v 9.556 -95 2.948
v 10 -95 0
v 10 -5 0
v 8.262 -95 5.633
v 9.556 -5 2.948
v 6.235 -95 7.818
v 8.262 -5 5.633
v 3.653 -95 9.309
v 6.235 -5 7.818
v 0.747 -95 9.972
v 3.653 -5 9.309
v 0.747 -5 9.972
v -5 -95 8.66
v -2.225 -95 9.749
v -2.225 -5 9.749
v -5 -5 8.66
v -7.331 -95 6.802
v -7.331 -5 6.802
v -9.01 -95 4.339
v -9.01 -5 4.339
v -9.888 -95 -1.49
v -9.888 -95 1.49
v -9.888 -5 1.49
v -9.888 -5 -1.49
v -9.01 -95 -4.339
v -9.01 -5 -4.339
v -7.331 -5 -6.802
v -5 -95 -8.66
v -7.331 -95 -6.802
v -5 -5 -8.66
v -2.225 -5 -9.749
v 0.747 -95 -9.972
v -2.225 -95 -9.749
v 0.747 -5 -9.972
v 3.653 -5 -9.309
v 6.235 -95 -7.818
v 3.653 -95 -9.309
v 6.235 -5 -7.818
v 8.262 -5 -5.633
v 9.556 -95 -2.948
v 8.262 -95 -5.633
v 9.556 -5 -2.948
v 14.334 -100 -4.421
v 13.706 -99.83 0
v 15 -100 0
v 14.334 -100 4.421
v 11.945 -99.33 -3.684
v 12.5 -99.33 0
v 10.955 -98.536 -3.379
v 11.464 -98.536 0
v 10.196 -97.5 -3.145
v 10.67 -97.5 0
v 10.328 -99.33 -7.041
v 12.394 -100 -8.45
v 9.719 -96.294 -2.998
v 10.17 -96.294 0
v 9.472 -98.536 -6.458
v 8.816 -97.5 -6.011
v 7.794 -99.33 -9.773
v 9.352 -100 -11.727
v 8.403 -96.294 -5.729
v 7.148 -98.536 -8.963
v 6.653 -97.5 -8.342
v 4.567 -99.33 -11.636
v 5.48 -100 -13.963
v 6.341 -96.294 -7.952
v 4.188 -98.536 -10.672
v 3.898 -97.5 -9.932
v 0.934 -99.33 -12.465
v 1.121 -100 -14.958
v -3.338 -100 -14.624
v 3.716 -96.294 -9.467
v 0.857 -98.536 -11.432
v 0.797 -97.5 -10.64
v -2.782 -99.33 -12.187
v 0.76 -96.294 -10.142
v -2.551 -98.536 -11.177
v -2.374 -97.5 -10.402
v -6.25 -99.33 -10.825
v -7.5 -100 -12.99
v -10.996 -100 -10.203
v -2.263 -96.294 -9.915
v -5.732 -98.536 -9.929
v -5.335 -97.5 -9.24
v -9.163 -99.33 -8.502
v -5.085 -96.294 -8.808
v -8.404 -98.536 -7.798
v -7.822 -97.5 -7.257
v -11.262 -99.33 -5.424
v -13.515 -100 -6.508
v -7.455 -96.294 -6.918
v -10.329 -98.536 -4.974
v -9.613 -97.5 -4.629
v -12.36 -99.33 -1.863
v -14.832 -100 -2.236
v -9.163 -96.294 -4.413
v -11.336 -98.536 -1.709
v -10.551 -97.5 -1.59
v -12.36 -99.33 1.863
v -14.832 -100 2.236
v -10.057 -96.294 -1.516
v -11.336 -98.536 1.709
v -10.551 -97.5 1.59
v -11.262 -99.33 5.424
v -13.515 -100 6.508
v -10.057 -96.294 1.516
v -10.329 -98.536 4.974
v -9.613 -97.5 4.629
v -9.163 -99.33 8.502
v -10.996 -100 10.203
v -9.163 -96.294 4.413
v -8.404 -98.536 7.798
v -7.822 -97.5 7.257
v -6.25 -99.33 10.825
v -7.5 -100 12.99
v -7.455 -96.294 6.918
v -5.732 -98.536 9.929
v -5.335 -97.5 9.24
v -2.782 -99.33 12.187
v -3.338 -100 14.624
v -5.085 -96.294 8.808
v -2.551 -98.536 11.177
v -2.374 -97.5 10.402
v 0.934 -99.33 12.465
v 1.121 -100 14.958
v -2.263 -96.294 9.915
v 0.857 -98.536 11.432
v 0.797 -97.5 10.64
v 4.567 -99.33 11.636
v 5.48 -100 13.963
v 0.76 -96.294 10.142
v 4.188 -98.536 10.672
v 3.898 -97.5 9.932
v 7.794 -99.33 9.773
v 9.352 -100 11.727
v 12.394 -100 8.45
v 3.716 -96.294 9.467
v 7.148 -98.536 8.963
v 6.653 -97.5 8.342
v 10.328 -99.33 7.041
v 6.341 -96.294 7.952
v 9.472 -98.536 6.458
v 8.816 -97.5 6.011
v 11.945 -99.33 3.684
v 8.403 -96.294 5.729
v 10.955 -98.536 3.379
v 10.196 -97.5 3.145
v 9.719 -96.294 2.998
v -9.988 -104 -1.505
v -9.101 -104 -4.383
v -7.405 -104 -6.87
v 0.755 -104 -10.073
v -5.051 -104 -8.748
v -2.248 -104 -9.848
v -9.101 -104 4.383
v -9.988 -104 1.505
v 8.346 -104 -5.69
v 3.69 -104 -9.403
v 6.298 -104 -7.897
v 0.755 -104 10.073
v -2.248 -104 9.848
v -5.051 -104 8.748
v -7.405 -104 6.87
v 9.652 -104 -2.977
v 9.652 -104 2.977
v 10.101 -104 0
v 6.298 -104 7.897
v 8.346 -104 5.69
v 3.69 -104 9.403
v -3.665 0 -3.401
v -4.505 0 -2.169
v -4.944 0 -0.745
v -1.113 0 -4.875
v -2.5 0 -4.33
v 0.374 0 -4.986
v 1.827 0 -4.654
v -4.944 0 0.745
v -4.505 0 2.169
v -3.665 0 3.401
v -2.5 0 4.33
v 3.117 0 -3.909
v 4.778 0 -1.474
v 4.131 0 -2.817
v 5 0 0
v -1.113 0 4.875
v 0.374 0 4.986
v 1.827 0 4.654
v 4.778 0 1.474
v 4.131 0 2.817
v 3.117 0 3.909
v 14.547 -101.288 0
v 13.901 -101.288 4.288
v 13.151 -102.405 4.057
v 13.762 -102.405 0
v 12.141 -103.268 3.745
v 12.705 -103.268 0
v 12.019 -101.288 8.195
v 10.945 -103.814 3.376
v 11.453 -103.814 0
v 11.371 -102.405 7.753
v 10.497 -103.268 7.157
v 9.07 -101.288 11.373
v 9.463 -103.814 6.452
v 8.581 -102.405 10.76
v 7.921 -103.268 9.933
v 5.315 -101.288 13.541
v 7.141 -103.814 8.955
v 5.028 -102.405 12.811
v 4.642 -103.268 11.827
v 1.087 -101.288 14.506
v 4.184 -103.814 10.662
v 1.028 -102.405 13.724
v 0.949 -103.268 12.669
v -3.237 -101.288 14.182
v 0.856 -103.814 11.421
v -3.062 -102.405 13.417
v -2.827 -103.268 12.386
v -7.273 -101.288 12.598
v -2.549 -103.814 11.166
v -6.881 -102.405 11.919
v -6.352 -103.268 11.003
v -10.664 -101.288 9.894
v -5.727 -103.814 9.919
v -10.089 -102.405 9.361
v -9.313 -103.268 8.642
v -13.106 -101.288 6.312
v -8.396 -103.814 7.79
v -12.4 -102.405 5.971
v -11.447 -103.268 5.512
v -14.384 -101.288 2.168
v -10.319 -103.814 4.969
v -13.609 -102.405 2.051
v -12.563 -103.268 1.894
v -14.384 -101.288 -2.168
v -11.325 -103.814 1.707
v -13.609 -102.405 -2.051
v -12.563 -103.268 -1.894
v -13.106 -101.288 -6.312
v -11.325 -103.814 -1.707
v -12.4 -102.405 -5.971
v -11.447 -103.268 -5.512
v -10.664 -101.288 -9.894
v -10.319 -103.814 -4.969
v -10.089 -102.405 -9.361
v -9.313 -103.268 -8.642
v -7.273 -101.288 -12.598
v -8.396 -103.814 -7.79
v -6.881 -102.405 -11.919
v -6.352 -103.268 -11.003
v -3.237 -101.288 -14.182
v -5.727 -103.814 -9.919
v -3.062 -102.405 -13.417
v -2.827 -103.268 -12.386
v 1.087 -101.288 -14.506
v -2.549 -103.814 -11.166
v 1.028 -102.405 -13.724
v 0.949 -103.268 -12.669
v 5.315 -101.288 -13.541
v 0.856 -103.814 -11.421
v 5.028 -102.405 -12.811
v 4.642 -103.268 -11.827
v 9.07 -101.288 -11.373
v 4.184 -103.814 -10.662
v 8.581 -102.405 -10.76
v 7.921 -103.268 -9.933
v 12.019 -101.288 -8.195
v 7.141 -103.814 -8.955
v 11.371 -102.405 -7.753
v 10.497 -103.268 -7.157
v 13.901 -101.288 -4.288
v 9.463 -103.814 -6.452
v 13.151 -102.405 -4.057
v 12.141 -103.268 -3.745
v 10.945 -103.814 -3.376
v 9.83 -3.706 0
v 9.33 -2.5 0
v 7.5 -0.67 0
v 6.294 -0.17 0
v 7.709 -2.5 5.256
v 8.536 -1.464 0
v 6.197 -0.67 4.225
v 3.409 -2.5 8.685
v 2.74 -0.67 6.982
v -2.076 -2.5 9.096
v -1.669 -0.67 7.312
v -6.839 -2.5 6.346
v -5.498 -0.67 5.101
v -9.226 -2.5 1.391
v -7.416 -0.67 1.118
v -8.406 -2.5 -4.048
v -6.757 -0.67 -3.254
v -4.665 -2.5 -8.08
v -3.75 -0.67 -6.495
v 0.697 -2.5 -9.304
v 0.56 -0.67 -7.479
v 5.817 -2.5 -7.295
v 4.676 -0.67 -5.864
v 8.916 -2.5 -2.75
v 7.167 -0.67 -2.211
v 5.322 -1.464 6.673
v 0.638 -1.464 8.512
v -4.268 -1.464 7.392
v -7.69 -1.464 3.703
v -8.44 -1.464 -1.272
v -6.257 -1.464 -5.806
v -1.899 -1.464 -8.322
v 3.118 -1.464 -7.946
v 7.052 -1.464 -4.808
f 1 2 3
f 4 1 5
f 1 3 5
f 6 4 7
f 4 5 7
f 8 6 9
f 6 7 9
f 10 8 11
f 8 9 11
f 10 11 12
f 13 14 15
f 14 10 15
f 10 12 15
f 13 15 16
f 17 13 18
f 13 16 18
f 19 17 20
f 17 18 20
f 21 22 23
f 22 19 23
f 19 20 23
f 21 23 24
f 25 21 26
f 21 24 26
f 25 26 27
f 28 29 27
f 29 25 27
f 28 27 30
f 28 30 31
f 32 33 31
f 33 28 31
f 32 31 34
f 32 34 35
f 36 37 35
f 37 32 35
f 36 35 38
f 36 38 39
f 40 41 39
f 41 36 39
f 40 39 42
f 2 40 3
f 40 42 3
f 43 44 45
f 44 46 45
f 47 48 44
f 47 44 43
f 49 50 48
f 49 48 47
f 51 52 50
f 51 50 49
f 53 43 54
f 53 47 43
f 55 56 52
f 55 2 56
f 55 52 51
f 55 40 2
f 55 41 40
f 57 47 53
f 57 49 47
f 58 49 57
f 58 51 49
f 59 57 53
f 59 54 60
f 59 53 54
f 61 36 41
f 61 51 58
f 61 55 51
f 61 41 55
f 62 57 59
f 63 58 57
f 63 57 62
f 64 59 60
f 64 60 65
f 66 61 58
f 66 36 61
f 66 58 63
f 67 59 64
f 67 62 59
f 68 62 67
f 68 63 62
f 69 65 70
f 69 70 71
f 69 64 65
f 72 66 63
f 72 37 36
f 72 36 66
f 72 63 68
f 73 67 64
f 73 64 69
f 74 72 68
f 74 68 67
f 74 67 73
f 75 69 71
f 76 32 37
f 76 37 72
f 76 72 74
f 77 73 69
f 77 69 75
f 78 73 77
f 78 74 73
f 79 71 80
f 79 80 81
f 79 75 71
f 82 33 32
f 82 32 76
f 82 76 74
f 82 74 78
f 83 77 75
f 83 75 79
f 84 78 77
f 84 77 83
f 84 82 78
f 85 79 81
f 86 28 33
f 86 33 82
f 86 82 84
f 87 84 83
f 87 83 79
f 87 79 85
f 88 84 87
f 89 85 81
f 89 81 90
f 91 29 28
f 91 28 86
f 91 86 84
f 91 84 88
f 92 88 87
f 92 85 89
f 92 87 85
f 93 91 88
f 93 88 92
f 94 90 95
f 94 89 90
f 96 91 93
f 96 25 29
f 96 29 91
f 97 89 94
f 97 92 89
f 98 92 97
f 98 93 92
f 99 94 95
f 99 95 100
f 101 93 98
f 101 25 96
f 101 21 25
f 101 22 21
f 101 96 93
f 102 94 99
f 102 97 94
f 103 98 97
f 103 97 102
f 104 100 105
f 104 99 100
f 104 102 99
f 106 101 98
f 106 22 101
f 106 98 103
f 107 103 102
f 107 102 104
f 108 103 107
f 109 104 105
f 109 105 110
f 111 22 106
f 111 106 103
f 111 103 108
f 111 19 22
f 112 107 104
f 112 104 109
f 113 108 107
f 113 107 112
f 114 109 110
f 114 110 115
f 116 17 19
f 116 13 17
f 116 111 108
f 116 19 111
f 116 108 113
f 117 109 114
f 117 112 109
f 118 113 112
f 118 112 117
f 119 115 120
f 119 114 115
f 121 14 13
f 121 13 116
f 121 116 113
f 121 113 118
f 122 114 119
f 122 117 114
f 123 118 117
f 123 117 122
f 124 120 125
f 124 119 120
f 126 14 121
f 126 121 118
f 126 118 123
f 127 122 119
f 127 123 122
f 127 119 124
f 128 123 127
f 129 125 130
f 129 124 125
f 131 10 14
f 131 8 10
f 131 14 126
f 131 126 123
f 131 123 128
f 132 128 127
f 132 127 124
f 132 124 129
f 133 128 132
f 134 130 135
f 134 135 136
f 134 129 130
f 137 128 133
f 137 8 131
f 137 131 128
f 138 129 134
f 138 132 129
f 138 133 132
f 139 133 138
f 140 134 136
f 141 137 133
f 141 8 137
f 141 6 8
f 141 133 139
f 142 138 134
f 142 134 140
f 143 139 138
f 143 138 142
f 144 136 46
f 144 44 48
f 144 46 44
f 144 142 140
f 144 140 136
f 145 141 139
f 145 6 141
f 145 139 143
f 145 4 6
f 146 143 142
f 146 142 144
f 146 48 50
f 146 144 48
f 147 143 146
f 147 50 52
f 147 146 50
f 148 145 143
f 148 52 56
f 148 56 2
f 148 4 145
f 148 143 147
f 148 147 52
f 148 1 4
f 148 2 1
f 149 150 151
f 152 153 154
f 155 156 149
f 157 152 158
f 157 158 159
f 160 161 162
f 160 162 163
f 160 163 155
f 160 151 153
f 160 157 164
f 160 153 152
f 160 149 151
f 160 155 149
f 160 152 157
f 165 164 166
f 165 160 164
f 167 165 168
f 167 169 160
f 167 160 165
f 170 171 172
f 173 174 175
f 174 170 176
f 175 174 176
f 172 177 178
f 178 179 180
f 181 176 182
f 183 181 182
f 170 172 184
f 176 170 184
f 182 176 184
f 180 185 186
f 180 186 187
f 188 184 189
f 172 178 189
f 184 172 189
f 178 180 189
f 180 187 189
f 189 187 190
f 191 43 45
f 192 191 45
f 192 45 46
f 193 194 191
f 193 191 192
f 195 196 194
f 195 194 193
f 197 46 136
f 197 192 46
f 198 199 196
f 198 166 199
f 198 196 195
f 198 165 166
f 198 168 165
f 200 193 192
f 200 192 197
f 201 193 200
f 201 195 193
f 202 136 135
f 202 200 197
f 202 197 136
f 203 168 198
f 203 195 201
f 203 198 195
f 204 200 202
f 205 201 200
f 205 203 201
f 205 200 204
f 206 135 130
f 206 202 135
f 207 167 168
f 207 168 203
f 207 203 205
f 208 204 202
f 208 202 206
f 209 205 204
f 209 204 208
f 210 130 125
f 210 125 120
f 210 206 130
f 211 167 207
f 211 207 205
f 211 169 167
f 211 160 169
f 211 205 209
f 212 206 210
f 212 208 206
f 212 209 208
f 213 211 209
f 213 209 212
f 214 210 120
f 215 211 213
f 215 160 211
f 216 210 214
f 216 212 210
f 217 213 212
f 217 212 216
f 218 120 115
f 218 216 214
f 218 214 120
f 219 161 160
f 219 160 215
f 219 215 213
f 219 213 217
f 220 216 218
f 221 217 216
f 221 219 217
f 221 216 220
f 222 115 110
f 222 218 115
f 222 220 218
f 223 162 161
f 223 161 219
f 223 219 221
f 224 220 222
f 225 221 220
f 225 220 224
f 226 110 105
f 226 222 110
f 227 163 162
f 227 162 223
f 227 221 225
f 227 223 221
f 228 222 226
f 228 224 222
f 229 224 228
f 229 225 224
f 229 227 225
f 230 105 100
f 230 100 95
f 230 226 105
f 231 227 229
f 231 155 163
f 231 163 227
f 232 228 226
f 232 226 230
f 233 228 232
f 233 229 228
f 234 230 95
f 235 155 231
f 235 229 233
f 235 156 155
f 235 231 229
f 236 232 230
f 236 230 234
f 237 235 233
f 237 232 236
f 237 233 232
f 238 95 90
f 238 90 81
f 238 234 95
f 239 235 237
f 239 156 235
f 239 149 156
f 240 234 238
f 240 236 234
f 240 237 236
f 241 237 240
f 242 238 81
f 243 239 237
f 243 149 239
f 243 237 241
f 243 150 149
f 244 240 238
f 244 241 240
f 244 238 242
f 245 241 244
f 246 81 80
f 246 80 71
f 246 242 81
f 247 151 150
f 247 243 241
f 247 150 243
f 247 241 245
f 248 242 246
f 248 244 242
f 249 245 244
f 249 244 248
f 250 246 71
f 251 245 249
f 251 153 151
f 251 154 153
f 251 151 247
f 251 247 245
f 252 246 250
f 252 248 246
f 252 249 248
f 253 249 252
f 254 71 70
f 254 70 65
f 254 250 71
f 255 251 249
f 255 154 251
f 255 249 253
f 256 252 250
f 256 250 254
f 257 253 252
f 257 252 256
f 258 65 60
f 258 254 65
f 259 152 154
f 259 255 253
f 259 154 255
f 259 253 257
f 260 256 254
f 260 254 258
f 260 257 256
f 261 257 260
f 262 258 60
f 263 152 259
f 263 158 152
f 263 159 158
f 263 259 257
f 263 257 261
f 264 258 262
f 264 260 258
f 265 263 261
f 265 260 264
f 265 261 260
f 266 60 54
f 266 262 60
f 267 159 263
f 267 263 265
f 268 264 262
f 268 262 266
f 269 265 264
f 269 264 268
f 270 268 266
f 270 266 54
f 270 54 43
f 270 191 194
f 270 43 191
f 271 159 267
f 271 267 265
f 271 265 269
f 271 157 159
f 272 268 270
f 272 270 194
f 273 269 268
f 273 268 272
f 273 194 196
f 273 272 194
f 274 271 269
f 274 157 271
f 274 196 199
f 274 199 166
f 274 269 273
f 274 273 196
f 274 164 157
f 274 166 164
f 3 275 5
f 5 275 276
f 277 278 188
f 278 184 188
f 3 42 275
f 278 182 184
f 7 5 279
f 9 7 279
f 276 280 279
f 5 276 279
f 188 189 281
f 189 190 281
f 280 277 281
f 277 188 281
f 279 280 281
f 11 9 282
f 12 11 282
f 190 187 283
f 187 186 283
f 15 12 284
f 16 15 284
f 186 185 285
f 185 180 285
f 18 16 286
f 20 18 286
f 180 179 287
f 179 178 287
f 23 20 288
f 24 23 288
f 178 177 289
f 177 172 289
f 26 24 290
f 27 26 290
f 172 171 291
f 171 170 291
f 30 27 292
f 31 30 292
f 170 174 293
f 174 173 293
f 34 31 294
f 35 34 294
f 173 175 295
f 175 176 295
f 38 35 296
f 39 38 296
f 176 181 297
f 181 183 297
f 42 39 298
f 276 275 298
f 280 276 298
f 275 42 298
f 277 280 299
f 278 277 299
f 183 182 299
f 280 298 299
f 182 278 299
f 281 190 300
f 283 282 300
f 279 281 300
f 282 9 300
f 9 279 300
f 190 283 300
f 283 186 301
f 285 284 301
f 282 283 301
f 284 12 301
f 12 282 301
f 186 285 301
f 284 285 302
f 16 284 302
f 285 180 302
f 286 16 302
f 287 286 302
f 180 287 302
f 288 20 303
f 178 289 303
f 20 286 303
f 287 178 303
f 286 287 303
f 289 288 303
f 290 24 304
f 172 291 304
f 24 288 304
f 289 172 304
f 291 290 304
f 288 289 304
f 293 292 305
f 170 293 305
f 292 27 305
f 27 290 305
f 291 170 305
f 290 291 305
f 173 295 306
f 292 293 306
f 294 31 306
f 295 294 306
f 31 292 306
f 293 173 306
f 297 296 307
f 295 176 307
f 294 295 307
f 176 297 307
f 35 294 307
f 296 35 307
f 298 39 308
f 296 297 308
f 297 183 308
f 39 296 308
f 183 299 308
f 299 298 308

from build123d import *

# Parameters (mm, degrees)
F0_R     = 10
F1_DEPTH = 104
F2_R     = 15
F3_DEPTH = 4
F4_R     = 4.99999


# Not quite as in the source:
# - a fillet or chamfer that OpenCascade refuses, or shapes differently, is made with other operations: its cross-section is extruded or revolved along the edge and cut away or added
# - a fillet or chamfer is up to 0.001 mm smaller than in the source, because OpenCascade refuses the exact size


with BuildPart() as f1:
    # F0 (on Front) → F1 (new body)
    with BuildSketch(Plane.XZ):
        Circle(F0_R)
    extrude(amount=F1_DEPTH)

    # F2 (on face) → F3 (join)
    with BuildSketch(Plane.XZ.offset(104)):
        Circle(F2_R)
    extrude(amount=-F3_DEPTH)

    # F4 (radius 5 in the source; OpenCascade refuses exactly that, so slightly less here)
    f4_edges = [f1.edges().sort_by_distance(p)[0] for p in [
        (-10, -100, 0),
    ]]
    fillet(f4_edges, radius=F4_R)

    # F5: fillet of radius 5 on 2 edges, made by hand

    # F5_s1 → F5_t2 (revolve, cut)
    with BuildSketch(Plane.XY):
        with BuildLine():
            ThreePointArc((15, -100), (13.2632981746, -102.8729833462), (10.1010205144, -104))
            Line((10.1010205144, -104), (15, -104))
            Line((15, -104), (15, -100))
        make_face()
    revolve(axis=Axis((0, -104, 0), (0, -1, 0)), mode=Mode.SUBTRACT)

    # F5_s3 → F5_t4 (revolve, cut)
    with BuildSketch(Plane.XY):
        with BuildLine():
            ThreePointArc((10, -5), (8.5355339059, -1.4644660941), (5, 0))
            Line((5, 0), (10, 0))
            Line((10, 0), (10, -5))
        make_face()
    revolve(axis=Axis((0, 0, 0), (0, -1, 0)), mode=Mode.SUBTRACT)


solid = f1.part
